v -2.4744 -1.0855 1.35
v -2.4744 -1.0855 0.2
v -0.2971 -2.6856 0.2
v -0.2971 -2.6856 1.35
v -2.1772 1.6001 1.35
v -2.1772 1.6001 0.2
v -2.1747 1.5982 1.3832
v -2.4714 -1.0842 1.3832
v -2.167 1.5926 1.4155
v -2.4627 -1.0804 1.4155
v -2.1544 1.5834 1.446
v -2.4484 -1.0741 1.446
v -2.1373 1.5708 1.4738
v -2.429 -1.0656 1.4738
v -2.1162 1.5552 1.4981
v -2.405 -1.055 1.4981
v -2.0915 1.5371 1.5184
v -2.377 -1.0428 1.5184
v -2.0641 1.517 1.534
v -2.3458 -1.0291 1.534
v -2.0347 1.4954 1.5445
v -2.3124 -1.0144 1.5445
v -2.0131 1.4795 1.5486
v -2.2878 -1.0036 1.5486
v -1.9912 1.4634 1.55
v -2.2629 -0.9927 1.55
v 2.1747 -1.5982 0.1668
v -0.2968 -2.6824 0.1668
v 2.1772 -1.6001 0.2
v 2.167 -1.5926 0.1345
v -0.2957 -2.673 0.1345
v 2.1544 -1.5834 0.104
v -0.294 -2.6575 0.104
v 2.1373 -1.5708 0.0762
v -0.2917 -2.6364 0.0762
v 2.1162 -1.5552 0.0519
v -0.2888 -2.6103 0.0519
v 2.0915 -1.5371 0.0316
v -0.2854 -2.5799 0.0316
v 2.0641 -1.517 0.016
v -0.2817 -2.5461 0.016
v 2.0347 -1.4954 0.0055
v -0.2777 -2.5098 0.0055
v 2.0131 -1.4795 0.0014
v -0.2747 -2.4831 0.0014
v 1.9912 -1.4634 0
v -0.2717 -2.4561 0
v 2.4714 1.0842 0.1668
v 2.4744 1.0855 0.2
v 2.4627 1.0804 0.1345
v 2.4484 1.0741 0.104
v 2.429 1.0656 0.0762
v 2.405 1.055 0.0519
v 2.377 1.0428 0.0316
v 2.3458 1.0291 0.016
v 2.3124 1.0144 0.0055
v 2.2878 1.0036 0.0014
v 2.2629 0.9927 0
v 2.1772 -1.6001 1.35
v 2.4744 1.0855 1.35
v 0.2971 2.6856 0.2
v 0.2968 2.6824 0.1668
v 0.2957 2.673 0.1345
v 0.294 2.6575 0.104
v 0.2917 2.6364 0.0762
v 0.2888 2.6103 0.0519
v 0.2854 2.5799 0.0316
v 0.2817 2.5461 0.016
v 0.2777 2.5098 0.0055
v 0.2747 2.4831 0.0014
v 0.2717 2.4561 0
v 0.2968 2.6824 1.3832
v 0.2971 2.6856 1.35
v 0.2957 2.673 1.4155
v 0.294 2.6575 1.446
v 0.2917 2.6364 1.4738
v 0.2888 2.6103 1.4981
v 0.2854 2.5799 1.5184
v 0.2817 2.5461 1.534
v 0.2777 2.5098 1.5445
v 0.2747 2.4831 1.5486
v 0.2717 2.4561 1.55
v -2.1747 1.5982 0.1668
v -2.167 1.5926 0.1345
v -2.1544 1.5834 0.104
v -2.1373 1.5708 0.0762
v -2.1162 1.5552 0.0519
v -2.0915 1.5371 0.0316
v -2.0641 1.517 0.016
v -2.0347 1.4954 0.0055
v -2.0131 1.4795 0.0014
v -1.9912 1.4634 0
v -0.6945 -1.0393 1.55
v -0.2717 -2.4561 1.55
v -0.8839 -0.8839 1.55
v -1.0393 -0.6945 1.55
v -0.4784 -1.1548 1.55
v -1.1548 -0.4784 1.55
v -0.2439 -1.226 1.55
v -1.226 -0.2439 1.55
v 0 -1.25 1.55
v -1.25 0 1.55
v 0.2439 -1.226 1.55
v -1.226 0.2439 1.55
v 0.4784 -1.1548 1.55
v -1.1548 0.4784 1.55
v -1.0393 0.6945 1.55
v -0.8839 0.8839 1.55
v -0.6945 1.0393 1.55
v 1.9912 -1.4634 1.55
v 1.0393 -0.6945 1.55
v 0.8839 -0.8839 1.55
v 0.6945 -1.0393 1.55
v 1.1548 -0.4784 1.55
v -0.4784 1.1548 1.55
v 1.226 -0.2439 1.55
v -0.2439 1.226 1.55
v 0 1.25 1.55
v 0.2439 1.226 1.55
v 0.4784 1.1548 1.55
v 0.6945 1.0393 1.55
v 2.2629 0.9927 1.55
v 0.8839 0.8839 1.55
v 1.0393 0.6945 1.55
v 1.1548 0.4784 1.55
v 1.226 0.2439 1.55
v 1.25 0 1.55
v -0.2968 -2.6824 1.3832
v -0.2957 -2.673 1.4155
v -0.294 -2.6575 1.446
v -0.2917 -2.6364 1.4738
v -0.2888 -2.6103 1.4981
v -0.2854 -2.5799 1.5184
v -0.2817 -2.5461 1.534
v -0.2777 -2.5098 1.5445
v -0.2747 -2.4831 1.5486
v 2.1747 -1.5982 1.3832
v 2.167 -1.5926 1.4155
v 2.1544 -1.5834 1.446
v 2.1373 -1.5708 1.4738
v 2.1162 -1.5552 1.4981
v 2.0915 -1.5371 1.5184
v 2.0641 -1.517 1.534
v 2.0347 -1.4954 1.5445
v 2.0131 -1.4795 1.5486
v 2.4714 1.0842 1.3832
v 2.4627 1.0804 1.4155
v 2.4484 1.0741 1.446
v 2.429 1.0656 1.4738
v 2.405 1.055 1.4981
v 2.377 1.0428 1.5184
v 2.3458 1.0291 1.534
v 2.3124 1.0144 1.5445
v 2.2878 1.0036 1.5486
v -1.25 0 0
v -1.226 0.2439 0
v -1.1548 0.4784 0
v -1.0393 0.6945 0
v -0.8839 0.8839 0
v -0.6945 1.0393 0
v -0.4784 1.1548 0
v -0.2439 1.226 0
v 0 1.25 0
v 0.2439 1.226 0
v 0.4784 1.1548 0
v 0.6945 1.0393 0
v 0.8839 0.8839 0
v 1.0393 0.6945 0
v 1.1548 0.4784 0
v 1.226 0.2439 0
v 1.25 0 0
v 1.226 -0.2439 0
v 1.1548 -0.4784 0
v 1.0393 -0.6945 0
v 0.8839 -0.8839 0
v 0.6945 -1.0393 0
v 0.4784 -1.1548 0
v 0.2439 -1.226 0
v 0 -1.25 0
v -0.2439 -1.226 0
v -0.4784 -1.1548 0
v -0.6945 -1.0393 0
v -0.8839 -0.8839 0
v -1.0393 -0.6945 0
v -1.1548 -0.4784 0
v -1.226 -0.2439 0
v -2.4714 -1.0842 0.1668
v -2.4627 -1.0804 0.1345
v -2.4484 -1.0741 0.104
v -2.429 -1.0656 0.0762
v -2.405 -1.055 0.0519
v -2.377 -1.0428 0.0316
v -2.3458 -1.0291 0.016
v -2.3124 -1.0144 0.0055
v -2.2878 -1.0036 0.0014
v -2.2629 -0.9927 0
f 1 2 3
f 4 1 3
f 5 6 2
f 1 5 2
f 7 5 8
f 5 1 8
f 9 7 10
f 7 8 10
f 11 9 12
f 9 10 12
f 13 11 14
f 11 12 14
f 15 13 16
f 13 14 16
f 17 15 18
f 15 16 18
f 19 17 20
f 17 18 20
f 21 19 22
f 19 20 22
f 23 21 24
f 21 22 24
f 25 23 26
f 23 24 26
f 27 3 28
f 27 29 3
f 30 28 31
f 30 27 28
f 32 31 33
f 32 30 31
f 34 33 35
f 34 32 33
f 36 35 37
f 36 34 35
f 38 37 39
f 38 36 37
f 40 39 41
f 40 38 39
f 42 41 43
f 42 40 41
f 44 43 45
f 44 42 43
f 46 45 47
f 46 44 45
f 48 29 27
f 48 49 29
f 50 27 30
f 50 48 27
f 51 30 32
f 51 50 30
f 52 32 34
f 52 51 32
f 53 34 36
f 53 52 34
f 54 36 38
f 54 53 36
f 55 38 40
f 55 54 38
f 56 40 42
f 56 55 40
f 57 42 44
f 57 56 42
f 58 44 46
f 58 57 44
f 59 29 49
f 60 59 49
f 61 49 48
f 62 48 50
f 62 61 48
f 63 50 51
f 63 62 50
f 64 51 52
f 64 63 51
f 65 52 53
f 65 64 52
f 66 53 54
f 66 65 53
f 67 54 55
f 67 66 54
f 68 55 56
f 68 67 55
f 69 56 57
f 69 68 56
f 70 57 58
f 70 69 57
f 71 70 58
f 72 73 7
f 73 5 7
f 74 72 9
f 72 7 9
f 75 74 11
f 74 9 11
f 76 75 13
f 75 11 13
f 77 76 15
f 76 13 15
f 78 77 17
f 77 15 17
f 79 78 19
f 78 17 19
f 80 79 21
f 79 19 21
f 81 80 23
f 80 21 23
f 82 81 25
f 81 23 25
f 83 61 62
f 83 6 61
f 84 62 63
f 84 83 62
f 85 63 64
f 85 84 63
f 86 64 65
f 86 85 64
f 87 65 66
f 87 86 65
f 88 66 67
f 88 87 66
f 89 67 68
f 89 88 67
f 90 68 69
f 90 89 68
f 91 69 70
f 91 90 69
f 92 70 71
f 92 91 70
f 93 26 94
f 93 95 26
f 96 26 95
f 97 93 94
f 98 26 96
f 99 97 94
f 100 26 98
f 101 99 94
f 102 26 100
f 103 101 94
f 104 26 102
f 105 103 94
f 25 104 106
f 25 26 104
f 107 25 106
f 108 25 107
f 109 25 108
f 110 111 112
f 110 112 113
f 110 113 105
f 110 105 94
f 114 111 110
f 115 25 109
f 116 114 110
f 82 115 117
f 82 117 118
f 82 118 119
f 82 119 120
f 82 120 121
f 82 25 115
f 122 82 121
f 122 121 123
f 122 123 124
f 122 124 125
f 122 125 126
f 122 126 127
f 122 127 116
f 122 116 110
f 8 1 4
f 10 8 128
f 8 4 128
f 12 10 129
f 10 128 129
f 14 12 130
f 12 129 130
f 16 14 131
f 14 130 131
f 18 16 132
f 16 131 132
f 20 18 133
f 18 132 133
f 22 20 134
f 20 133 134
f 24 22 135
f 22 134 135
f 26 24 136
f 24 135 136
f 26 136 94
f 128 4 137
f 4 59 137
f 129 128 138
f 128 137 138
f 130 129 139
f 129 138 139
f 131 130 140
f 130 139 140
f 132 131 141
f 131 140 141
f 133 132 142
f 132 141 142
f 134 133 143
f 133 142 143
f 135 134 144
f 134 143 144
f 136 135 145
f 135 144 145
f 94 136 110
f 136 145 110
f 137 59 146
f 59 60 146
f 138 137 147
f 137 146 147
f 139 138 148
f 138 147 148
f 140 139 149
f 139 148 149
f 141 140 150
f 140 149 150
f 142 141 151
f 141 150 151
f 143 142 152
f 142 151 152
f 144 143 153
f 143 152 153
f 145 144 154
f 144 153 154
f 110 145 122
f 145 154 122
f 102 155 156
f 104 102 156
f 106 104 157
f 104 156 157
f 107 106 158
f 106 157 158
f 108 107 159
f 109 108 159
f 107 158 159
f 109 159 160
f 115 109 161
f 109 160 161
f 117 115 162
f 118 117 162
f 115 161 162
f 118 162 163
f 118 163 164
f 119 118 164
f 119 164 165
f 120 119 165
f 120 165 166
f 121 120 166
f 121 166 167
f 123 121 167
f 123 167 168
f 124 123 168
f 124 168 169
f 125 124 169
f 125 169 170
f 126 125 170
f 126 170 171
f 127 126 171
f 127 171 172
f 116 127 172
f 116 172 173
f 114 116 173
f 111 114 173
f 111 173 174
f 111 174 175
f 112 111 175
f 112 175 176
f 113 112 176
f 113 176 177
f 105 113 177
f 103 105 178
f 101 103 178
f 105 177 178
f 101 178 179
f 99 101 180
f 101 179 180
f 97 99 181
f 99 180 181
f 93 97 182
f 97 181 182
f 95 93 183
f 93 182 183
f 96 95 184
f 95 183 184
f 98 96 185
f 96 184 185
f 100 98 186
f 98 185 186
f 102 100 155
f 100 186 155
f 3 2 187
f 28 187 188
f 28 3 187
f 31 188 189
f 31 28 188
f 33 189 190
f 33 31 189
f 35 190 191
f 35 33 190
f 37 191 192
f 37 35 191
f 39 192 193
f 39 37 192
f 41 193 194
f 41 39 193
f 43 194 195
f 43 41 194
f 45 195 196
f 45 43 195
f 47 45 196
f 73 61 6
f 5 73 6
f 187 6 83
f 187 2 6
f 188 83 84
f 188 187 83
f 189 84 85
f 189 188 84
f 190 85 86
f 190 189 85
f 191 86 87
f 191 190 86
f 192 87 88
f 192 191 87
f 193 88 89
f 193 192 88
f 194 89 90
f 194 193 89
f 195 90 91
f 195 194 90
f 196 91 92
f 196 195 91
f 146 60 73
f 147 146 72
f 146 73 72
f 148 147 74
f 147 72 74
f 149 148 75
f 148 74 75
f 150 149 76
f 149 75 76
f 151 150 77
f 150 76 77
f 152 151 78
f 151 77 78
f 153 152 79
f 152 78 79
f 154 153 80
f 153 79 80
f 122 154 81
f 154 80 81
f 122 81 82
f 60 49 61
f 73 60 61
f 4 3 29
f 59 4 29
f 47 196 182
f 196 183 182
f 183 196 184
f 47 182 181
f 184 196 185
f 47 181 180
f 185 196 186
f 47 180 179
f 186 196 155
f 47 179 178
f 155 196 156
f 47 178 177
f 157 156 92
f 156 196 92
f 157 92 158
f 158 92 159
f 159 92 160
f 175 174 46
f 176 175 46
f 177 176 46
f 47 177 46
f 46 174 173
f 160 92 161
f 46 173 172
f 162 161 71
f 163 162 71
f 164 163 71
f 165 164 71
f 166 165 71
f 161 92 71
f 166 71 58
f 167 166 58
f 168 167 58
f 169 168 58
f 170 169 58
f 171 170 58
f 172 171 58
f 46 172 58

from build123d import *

# Parameters (mm, degrees)
BOSS_EXTRUDE1_DEPTH   = 1.55
FILLET1_R             = 0.2
F_2_5MM_DOWEL_HOLE1_D = 2.5


with BuildPart() as part:
    # Sketch1 → Boss-Extrude1 (new body)
    with BuildSketch(Plane.XY):
        Polygon((0.297131561, 2.68561219), (-2.177242601, 1.600129575), (-2.474374162, -1.085482615), (-0.297131561, -2.68561219), (2.177242601, -1.600129575), (2.474374162, 1.085482615), align=None)
    extrude(amount=BOSS_EXTRUDE1_DEPTH)

    # Fillet1
    fillet1_edges = [part.edges().sort_by_distance(p)[0] for p in [
        (-2.325808381, 0.25732348, 1.55),
        (-1.385752862, -1.885547402, 1.55),
        (0.94005552, -2.142870883, 1.55),
        (2.325808381, -0.25732348, 1.55),
        (1.385752862, 1.885547402, 1.55),
        (2.325808381, -0.25732348, 0),
        (0.94005552, -2.142870883, 0),
        (-1.385752862, -1.885547402, 0),
        (-0.94005552, 2.142870883, 1.55),
        (-2.325808381, 0.25732348, 0),
        (-0.94005552, 2.142870883, 0),
        (1.385752862, 1.885547402, 0),
    ]]
    fillet(fillet1_edges, radius=FILLET1_R)

    # Ø2.5mm Dowel Hole1 (through all)
    with Locations(Plane.XY.offset(1.55)):
        with Locations((0, 0)):
            Hole(F_2_5MM_DOWEL_HOLE1_D / 2)


solid = part.part
